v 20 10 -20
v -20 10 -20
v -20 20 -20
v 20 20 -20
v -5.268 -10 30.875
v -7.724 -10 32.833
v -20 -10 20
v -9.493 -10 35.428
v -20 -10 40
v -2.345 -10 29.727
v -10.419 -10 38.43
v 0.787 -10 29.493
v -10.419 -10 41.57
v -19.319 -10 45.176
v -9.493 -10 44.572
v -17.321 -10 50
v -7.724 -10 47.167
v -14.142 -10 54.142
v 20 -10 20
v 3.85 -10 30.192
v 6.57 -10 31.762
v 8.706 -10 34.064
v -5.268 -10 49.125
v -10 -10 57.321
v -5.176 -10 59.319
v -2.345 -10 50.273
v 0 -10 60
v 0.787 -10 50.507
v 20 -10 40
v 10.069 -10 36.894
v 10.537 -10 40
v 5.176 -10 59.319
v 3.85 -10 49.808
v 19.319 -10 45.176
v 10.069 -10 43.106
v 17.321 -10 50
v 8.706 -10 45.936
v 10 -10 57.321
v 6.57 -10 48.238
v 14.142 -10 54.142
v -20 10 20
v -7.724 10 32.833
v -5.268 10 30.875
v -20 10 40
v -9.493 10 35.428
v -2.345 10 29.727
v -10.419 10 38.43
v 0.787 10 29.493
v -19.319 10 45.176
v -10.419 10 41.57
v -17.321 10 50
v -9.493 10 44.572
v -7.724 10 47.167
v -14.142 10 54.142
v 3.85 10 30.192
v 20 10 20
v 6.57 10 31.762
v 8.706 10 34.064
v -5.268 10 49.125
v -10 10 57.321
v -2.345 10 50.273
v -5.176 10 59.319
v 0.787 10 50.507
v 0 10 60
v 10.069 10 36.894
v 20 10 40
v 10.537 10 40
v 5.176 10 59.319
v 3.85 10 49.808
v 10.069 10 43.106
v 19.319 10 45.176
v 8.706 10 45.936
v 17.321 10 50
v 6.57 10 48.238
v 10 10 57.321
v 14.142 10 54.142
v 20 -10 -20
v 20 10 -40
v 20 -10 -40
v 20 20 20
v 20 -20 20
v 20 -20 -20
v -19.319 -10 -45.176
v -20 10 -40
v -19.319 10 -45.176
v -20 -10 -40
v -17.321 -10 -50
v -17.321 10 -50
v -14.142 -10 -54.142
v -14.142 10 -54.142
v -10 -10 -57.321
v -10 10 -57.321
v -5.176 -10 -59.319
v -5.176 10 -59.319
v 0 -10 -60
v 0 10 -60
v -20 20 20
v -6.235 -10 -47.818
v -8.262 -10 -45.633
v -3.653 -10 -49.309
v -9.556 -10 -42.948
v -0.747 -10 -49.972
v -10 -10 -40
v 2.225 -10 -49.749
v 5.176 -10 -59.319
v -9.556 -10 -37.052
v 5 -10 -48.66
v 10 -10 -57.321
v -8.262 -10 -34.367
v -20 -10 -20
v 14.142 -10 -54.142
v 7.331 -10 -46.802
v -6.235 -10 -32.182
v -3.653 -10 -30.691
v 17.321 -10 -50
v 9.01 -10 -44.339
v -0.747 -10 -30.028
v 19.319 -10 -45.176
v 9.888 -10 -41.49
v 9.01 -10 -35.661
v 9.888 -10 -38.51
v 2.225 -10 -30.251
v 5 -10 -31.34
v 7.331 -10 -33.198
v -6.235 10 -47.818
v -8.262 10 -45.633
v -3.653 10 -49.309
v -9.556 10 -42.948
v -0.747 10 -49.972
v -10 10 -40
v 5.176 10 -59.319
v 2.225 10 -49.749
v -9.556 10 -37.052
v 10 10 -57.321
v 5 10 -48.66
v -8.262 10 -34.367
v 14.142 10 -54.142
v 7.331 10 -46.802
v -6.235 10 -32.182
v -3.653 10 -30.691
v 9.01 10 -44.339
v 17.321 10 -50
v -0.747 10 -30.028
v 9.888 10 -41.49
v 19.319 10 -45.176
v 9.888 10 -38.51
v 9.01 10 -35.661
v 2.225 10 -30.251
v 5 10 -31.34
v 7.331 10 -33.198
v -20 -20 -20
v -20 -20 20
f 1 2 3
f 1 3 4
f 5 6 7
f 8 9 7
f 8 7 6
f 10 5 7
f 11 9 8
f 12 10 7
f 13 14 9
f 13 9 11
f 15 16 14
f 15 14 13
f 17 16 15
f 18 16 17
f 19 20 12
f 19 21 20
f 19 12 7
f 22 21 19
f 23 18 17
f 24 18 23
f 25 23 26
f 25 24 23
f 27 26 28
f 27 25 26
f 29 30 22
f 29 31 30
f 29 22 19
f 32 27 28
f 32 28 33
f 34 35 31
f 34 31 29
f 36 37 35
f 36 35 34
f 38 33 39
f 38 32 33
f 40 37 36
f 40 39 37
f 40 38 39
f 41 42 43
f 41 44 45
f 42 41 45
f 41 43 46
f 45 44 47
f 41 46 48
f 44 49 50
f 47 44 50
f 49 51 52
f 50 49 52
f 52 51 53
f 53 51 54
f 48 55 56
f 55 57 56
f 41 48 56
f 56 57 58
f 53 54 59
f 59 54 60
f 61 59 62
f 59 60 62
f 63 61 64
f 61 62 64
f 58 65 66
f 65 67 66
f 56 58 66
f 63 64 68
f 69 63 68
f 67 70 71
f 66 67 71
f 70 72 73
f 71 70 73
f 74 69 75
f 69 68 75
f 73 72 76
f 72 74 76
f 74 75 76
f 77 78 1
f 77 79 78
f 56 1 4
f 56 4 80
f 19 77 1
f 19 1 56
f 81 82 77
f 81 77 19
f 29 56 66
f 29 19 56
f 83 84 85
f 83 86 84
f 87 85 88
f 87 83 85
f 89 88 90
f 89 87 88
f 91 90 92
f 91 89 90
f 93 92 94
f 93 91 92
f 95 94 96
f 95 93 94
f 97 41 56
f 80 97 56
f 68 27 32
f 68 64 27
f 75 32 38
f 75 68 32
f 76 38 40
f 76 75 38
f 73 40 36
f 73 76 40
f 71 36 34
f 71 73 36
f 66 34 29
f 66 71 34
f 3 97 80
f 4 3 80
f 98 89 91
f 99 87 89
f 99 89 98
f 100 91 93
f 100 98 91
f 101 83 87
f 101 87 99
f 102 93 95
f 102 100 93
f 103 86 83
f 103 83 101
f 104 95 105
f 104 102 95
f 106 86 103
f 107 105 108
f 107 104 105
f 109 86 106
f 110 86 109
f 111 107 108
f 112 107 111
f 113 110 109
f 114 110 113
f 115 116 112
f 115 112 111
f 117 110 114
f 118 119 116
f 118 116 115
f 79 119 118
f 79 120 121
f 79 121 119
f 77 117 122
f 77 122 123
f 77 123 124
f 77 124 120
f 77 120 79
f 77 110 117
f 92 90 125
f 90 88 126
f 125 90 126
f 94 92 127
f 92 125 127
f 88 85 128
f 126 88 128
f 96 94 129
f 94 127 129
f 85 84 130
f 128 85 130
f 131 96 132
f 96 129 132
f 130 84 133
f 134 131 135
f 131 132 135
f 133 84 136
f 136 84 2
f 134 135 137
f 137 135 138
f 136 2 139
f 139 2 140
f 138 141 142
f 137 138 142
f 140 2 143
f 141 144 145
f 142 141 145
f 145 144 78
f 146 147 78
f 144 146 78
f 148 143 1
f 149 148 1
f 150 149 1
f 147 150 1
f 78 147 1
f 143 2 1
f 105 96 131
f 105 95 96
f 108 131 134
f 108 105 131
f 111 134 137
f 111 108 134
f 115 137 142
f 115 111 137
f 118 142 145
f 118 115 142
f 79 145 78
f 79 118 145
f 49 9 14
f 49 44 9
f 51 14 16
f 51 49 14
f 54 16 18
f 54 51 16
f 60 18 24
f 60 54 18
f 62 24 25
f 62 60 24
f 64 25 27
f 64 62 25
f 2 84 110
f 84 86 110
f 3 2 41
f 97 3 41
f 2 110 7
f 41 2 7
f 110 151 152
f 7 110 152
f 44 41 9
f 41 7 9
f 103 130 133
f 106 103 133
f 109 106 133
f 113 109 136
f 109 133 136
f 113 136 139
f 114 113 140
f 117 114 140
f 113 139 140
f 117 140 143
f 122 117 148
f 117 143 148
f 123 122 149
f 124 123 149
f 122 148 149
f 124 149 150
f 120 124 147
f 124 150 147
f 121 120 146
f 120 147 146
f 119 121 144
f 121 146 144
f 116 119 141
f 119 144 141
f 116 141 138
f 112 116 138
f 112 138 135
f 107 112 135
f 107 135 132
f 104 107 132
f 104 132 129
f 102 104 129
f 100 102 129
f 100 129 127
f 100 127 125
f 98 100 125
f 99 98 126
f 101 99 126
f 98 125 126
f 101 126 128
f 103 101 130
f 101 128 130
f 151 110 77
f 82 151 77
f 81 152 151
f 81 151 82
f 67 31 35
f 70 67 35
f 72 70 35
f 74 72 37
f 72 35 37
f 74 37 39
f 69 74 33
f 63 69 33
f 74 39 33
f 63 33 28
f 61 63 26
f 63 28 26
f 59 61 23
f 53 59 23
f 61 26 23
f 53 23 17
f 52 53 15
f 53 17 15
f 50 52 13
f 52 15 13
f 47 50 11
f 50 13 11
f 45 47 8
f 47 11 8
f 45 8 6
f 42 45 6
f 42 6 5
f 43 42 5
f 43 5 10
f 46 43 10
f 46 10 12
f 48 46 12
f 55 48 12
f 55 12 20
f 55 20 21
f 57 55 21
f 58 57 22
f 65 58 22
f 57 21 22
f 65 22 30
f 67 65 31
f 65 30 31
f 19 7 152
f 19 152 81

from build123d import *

# Parameters (mm, degrees)
F0_W     = 40
F0_H     = 120
F1_DEPTH = 10
F2_W     = 40
F2_H     = 40
F3_DEPTH = 10
F5_R     = 10.5368442401
F6_DEPTH = 20
F7_R     = 10
F8_DEPTH = 20
F9_R     = 19.99999
F10_R    = 19.99999


# Not quite as in the source:
# - a fillet or chamfer is up to 0.001 mm smaller than in the source, because OpenCascade refuses the exact size


with BuildPart() as f1:
    # F0 (on Front) → F1 (new body)
    with BuildSketch(Plane.XZ):
        Rectangle(F0_W, F0_H)
    extrude(amount=F1_DEPTH)

    # F2 (on face) → F3 (join)
    with BuildSketch(Plane.XZ.offset(10)):
        Rectangle(F2_W, F2_H)
    extrude(amount=F3_DEPTH)

    # F4: F1 across face


with BuildPart() as f1_1:
    add(f1.part)
    add(f1.part.mirror(Plane(origin=(0, 0, 0), x_dir=(1, 0, 0), z_dir=(0, 1, 0))))

    # F5 (on face) → F6 (cut, through all)
    with BuildSketch(Plane.XZ.offset(10)):
        with Locations((0, 40)):
            Circle(F5_R)
    extrude(amount=-F6_DEPTH, mode=Mode.SUBTRACT)

    # F7 (on face) → F8 (cut, through all)
    with BuildSketch(Plane(origin=(0, 10, 0), x_dir=(-1, 0, 0), z_dir=(0, 1, 0))):
        with Locations((0, -40)):
            Circle(F7_R)
    extrude(amount=-F8_DEPTH, mode=Mode.SUBTRACT)

    # F9 (radius 20 in the source; OpenCascade refuses exactly that, so slightly less here)
    f9_edges = [f1_1.edges().sort_by_distance(p)[0] for p in [
        (-20, 0, 60),
        (20, 0, 60),
    ]]
    fillet(f9_edges, radius=F9_R)

    # F10 (radius 20 in the source; OpenCascade refuses exactly that, so slightly less here)
    f10_edges = [f1_1.edges().sort_by_distance(p)[0] for p in [
        (20, 0, -60),
        (-20, 0, -60),
    ]]
    fillet(f10_edges, radius=F10_R)


solid = f1_1.part
